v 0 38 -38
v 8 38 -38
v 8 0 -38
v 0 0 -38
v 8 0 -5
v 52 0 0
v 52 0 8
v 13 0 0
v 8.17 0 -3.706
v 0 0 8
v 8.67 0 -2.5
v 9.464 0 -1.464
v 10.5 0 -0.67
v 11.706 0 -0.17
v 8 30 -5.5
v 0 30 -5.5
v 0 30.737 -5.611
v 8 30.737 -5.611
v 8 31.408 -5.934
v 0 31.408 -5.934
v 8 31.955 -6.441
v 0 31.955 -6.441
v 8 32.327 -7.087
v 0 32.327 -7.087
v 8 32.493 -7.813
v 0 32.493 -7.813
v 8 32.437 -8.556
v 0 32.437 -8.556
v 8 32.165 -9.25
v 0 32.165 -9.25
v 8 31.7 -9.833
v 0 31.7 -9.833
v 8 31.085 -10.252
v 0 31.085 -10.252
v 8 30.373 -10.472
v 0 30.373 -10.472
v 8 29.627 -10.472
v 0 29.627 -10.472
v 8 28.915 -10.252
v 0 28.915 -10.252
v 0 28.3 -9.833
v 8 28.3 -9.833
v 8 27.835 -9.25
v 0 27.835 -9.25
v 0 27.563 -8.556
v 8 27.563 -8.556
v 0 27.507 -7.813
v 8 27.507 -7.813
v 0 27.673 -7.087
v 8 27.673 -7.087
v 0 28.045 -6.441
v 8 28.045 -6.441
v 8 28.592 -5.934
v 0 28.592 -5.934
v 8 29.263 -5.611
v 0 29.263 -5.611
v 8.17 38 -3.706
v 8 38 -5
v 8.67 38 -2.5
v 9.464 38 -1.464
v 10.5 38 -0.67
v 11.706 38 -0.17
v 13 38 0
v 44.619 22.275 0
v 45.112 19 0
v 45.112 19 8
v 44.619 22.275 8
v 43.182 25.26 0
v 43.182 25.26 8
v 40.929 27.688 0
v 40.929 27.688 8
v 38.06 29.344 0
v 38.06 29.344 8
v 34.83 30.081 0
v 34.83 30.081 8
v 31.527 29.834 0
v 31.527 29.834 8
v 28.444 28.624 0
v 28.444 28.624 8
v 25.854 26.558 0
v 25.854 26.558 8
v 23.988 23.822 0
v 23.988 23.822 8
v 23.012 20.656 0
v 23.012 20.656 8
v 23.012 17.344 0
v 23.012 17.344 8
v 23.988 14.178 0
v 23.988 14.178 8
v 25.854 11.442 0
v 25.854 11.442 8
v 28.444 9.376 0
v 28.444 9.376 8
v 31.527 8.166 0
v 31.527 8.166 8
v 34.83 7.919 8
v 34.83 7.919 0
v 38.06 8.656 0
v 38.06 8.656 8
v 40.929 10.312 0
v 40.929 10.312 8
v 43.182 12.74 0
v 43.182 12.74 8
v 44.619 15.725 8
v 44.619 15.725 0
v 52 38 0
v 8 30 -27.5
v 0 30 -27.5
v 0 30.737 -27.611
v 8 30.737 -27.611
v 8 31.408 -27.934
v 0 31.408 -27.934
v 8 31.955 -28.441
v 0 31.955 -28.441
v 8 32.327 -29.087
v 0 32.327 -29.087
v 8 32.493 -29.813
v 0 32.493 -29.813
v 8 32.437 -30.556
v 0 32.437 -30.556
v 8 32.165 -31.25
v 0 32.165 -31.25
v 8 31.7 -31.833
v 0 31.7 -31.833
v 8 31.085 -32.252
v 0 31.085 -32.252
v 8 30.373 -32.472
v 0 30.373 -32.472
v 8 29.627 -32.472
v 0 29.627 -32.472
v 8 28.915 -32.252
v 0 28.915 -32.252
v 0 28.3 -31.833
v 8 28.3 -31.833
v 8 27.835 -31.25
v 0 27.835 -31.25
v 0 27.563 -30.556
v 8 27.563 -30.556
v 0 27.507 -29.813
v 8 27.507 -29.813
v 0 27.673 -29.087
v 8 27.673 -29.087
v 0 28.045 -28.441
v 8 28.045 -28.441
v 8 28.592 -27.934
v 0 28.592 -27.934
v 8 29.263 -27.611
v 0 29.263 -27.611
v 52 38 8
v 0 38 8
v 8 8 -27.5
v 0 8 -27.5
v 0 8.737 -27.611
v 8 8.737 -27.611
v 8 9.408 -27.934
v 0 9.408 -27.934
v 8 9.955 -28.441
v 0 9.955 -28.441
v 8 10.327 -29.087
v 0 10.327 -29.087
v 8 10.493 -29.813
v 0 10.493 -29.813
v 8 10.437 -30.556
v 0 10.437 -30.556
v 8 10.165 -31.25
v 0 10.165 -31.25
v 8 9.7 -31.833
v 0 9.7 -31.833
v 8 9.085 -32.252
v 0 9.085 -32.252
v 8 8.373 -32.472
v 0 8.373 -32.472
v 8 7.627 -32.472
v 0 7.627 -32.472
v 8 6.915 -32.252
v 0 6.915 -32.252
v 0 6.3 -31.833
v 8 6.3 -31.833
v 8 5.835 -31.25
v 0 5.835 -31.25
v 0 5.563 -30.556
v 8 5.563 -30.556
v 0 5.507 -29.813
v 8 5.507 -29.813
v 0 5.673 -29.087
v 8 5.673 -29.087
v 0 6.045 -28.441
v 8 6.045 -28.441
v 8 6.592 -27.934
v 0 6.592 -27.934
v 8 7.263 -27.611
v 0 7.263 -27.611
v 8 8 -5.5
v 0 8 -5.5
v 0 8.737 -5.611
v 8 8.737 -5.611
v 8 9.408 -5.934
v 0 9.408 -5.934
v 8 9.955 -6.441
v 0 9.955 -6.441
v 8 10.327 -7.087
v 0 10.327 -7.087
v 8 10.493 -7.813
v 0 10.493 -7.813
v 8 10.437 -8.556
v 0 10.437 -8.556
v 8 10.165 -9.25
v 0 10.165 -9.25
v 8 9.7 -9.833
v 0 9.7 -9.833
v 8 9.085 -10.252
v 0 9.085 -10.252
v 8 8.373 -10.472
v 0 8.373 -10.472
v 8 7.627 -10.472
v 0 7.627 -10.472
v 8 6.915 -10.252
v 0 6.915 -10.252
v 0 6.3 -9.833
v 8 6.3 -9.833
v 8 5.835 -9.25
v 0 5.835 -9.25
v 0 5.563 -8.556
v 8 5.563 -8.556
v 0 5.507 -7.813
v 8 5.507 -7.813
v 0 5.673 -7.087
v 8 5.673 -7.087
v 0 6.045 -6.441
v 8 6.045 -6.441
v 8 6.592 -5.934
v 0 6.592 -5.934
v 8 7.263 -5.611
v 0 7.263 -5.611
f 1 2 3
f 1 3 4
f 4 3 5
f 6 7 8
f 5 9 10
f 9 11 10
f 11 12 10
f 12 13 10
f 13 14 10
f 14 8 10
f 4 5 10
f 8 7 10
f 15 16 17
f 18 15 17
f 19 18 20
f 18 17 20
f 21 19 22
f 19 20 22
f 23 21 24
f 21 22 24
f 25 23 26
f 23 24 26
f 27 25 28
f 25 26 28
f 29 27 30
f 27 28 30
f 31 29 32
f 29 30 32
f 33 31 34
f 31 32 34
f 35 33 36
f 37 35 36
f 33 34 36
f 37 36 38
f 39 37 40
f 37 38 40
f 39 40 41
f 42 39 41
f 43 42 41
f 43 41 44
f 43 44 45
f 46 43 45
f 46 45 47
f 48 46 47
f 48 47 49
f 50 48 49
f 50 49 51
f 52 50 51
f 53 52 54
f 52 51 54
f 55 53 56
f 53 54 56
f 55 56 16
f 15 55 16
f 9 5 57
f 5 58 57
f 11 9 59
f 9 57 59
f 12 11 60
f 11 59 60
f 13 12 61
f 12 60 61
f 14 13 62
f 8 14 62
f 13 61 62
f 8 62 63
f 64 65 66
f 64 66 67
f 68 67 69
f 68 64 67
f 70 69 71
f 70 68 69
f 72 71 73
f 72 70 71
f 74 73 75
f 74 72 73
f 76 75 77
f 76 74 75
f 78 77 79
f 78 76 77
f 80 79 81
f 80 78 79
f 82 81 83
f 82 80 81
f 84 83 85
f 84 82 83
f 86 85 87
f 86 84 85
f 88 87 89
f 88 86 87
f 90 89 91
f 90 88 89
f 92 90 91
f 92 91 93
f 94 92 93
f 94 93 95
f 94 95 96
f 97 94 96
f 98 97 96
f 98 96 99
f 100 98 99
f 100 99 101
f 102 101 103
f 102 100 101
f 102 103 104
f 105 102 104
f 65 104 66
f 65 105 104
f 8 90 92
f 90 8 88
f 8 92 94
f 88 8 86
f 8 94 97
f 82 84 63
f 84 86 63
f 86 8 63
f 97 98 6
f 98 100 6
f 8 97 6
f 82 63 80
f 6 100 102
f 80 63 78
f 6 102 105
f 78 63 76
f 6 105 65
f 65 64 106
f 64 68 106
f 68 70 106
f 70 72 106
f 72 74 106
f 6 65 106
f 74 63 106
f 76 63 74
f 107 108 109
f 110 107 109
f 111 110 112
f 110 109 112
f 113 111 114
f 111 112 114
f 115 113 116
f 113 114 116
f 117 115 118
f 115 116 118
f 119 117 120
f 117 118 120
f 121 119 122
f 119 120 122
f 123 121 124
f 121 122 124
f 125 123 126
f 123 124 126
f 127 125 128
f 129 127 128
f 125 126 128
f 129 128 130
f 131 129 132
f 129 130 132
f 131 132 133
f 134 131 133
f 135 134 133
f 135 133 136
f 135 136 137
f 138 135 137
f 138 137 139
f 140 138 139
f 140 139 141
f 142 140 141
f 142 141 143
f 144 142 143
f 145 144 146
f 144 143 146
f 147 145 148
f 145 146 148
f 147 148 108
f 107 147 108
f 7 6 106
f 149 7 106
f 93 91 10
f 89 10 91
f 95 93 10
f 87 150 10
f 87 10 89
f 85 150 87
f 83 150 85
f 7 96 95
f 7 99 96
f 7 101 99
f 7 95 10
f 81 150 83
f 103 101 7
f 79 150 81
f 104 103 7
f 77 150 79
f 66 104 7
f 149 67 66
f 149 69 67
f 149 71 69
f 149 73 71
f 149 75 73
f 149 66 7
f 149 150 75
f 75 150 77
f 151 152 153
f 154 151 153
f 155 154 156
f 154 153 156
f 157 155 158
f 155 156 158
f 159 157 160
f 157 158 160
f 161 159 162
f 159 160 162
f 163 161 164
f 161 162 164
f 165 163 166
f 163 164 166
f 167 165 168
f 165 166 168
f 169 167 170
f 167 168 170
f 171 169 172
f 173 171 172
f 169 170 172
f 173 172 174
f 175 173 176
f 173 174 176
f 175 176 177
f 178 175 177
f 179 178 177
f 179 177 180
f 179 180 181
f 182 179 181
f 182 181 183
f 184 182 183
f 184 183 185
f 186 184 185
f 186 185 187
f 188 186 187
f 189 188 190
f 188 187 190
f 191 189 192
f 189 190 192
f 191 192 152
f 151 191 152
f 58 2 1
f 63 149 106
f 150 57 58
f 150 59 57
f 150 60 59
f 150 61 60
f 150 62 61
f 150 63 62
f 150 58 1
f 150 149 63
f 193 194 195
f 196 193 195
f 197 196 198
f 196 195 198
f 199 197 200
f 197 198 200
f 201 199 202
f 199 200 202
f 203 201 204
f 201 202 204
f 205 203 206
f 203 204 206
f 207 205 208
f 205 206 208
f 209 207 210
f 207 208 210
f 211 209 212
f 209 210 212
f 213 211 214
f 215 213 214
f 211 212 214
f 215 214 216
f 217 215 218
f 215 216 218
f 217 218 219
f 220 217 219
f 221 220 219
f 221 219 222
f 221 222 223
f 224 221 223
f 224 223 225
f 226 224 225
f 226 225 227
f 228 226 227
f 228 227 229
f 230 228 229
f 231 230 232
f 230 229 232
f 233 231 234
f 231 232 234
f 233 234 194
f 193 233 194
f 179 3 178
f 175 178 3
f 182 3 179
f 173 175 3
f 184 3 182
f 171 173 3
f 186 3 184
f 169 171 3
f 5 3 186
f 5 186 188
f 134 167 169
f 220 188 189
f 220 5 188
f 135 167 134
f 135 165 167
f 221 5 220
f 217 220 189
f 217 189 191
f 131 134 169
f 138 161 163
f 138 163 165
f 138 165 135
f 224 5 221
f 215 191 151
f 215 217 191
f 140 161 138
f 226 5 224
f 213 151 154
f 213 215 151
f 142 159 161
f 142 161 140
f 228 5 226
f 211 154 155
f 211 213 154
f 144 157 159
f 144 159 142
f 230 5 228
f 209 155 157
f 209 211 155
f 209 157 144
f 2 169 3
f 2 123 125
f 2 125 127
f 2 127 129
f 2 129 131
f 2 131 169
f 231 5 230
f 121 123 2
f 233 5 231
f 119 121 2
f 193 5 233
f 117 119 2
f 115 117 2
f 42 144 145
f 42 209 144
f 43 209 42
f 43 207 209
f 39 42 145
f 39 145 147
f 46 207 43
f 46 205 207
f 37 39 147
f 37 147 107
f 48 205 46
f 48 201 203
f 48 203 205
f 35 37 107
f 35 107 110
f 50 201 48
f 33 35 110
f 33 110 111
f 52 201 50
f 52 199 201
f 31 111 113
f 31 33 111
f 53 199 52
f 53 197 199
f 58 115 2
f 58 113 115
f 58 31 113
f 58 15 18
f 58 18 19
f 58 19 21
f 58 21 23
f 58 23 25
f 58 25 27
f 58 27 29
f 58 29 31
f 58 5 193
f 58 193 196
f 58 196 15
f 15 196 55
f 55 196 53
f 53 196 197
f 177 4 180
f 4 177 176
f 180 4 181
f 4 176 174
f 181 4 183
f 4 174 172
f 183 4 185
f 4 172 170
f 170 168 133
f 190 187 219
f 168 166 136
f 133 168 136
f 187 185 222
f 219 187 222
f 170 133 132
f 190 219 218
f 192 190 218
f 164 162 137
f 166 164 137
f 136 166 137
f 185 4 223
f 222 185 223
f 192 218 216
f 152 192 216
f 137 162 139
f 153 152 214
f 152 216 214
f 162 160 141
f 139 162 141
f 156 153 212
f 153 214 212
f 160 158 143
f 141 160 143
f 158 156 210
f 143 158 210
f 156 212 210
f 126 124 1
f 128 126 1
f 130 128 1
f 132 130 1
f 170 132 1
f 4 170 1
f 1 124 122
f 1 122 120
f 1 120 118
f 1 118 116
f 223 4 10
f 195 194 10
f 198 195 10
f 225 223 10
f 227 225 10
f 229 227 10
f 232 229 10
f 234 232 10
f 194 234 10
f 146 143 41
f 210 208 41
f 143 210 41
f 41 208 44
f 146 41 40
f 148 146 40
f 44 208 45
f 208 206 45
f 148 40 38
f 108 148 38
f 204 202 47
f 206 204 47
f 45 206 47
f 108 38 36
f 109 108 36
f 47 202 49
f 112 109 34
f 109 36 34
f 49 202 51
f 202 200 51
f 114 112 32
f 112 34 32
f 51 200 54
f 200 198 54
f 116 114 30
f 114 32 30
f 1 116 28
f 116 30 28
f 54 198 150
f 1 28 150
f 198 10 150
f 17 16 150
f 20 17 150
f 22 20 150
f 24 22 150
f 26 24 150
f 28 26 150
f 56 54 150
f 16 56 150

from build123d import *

# Parameters (mm, degrees)
SKETCH1_W        = 52
SKETCH1_H        = 38
SKETCH1_R        = 11.1125
FACEUP_DEPTH     = 8
SKETCH8_W        = 8
SKETCH8_H        = 38
FACEDOWN_DEPTH   = 38
FILLET1_R        = 5
SKETCH9_R        = 2.5
SCREWHOLES_DEPTH = 8


with BuildPart() as part:
    # Sketch1 → FaceUp (new body)
    with BuildSketch(Plane.XY):
        with Locations((26, 19)):
            Rectangle(SKETCH1_W, SKETCH1_H)
        with Locations((34, 19)):
            Circle(SKETCH1_R, mode=Mode.SUBTRACT)
    extrude(amount=FACEUP_DEPTH)

    # Sketch8 → FaceDown (add)
    with BuildSketch(Plane(origin=(0, 0, 0), x_dir=(-1, 0, 0), z_dir=(0, 0, -1))):
        with Locations((-4, 19)):
            Rectangle(SKETCH8_W, SKETCH8_H)
    extrude(amount=FACEDOWN_DEPTH)

    # Fillet1
    fillet1_edges = [part.edges().sort_by_distance(p)[0] for p in [
        (8, 19, 0),
    ]]
    fillet(fillet1_edges, radius=FILLET1_R)

    # Sketch9 → ScrewHoles (cut)
    with BuildSketch(Plane.ZY):
        with Locations((-8, 30)):
            Circle(SKETCH9_R)
        with Locations((-30, 30)):
            Circle(SKETCH9_R)
        with Locations((-8, 8)):
            Circle(SKETCH9_R)
        with Locations((-30, 8)):
            Circle(SKETCH9_R)
    extrude(amount=-SCREWHOLES_DEPTH, mode=Mode.SUBTRACT)


solid = part.part
